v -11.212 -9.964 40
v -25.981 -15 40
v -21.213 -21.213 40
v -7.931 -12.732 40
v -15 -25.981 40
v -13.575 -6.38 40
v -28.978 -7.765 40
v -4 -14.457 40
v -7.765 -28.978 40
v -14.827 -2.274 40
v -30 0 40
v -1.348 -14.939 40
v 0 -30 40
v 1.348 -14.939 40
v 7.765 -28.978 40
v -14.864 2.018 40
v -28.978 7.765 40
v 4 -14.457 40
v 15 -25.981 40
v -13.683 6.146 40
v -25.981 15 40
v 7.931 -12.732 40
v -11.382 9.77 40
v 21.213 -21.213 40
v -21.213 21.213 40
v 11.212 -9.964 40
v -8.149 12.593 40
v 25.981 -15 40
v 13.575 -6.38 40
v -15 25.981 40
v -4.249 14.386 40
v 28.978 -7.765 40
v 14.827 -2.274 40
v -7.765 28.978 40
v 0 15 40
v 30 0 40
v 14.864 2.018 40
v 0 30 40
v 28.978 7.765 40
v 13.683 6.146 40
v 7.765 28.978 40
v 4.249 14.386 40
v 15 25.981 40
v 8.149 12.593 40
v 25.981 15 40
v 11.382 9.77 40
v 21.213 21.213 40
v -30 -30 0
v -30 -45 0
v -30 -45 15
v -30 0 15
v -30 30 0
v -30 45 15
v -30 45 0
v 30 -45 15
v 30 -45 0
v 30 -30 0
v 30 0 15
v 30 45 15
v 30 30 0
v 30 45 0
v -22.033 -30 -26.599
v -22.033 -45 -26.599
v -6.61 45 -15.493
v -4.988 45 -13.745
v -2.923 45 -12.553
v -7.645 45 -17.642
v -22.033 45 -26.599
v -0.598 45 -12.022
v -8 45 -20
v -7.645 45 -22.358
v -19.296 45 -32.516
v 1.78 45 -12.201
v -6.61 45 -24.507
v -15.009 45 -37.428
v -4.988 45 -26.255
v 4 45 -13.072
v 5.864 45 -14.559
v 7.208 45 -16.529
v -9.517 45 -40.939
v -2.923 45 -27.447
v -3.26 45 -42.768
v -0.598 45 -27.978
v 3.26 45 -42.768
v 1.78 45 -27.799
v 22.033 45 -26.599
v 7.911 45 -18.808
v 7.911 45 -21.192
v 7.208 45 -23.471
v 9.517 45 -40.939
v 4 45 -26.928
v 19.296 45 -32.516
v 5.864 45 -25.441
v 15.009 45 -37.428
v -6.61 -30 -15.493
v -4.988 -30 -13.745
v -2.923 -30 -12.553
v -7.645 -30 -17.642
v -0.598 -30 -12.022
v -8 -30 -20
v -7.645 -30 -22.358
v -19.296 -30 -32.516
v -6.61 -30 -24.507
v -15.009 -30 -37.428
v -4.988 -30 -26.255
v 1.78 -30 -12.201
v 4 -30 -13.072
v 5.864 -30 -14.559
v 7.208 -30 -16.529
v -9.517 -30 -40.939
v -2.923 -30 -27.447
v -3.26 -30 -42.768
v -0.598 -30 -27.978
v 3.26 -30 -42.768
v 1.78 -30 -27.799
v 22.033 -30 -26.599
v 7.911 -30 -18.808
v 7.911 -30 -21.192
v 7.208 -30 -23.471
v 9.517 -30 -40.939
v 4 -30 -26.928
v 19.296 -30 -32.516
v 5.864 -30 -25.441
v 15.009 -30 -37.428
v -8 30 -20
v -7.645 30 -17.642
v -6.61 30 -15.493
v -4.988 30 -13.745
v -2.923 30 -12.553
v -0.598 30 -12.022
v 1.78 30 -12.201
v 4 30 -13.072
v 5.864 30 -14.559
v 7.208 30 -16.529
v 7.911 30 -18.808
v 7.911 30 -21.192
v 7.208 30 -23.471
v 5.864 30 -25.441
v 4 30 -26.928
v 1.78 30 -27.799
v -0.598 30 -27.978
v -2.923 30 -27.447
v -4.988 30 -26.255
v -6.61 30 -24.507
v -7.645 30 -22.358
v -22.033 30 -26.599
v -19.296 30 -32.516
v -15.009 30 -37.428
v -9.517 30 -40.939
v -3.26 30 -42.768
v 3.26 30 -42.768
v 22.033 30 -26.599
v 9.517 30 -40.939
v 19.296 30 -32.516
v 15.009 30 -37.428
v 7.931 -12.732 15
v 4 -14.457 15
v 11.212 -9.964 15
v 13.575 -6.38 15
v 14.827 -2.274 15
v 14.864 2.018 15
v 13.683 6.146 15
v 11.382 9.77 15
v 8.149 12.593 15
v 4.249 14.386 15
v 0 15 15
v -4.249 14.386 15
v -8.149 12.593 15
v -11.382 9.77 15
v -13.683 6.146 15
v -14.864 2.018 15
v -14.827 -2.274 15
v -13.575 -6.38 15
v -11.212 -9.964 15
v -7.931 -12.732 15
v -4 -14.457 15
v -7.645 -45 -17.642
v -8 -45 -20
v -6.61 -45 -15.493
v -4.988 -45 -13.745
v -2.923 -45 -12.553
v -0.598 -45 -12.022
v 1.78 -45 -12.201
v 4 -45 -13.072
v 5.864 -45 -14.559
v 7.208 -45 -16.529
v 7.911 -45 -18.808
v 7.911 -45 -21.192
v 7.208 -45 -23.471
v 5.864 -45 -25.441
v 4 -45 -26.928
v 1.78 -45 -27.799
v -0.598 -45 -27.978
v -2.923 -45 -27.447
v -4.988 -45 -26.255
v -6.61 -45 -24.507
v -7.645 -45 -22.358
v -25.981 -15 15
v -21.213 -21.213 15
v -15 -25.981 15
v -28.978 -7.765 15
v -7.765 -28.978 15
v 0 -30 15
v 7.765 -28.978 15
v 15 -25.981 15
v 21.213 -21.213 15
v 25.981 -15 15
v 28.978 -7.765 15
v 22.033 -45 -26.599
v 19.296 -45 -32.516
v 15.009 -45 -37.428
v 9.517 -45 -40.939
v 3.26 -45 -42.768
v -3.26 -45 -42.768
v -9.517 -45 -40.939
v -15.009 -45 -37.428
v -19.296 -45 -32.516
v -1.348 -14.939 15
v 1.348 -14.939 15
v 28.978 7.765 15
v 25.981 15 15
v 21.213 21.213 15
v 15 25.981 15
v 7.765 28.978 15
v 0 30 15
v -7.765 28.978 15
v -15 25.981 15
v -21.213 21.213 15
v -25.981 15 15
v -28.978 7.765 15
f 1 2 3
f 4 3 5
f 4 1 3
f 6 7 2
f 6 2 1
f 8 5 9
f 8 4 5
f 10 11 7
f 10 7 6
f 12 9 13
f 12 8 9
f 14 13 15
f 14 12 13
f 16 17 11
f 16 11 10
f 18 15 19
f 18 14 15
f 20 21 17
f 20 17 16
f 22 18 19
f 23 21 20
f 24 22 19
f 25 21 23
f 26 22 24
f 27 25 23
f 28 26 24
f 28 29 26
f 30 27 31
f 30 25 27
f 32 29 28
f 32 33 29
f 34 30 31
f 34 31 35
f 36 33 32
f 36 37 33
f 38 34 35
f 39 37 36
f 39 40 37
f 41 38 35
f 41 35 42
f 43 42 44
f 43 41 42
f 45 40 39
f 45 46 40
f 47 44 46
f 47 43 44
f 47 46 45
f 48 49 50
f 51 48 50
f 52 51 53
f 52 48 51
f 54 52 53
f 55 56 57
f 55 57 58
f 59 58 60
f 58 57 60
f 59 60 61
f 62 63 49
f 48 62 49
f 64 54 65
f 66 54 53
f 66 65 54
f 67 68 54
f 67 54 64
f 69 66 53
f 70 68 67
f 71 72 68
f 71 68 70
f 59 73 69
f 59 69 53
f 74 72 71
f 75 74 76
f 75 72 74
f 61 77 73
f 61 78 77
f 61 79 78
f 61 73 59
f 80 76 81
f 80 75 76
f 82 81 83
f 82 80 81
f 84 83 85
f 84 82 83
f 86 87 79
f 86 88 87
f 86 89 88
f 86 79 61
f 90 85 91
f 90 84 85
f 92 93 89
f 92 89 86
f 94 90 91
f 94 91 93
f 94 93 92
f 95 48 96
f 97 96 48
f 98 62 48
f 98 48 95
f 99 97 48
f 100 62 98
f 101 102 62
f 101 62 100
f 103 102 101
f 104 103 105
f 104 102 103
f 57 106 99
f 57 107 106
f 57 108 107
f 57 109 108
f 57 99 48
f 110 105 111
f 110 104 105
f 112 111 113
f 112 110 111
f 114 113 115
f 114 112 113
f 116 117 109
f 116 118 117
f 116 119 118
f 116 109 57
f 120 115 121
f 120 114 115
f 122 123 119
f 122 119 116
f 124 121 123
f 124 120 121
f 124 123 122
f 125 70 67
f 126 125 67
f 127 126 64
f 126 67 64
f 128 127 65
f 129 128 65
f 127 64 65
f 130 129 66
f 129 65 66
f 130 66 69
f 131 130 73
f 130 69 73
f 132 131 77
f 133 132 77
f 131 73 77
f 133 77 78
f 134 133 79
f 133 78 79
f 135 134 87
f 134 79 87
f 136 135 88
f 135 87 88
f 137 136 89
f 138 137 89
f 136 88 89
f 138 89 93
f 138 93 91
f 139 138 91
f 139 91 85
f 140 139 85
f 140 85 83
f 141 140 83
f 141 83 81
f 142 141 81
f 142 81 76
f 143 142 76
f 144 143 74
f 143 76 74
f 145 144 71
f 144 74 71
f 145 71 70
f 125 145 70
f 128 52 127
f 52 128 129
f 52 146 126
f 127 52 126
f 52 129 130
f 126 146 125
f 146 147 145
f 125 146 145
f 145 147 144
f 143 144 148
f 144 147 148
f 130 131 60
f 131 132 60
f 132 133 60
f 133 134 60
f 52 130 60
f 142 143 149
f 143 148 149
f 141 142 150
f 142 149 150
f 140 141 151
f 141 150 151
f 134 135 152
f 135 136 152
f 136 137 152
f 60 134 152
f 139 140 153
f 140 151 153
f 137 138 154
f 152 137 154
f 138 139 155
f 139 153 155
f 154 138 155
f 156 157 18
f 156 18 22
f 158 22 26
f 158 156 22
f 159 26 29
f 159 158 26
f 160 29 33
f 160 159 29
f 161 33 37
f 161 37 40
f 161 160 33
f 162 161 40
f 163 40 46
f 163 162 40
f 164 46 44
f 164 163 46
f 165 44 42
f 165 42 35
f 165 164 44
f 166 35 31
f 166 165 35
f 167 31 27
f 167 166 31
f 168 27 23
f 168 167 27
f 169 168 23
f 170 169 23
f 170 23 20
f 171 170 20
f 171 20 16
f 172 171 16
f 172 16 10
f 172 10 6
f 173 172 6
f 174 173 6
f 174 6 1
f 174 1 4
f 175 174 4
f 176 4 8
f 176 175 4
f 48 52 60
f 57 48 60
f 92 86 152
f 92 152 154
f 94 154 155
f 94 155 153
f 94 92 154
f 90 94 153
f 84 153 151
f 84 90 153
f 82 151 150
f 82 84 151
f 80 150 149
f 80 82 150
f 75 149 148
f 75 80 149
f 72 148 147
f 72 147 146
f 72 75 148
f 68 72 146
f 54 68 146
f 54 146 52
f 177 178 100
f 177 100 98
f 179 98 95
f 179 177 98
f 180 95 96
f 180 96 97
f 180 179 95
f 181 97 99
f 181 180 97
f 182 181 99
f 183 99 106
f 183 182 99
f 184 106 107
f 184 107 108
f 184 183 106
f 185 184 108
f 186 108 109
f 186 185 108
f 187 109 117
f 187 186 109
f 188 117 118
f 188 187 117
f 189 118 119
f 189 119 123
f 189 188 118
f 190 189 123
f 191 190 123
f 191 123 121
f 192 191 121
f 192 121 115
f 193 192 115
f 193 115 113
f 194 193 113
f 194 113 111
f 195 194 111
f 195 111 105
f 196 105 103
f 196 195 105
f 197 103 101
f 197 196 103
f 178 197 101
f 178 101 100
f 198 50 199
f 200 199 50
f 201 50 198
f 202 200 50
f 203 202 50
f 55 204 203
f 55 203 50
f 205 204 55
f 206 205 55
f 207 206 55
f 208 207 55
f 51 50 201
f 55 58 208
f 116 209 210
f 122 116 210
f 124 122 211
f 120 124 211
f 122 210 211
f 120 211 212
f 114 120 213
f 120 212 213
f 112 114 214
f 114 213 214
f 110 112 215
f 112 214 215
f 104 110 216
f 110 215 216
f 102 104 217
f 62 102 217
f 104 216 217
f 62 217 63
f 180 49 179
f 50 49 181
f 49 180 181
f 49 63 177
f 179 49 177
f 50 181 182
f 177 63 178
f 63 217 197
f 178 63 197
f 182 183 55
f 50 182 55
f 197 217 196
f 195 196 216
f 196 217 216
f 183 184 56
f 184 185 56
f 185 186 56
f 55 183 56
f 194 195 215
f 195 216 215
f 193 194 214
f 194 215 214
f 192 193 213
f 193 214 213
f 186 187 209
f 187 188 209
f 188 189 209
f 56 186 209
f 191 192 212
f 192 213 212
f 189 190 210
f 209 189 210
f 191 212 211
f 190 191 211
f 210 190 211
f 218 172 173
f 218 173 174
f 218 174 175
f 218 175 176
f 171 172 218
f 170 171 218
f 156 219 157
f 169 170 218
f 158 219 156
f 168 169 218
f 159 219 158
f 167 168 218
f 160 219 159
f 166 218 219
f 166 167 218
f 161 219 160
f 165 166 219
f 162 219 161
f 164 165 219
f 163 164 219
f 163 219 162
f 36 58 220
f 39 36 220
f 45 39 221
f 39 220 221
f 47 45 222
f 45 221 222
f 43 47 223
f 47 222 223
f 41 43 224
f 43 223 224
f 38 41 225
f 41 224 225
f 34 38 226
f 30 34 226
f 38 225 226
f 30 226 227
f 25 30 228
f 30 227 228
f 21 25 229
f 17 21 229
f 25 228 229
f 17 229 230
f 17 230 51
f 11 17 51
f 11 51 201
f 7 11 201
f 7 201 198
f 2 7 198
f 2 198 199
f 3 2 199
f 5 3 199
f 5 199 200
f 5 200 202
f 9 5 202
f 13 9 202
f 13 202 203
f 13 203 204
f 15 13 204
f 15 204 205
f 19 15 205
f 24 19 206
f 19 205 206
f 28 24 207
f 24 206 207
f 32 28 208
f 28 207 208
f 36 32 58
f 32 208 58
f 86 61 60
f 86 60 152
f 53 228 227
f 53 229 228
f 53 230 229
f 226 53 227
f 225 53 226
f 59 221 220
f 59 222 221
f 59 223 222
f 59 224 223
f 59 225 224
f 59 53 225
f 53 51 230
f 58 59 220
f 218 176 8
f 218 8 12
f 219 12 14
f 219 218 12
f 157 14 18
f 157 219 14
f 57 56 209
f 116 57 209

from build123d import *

# Parameters (mm, degrees)
SKETCH1_W           = 60
SKETCH1_H           = 90
BOSS_EXTRUDE1_DEPTH = 15
SKETCH2_R           = 30
BOSS_EXTRUDE2_DEPTH = 25
SKETCH3_R           = 8
BOSS_EXTRUDE3_DEPTH = 15


with BuildPart() as part:
    # Sketch1 → Boss-Extrude1 (new body)
    with BuildSketch(Plane.XY):
        Rectangle(SKETCH1_W, SKETCH1_H)
    extrude(amount=BOSS_EXTRUDE1_DEPTH)

    # Sketch2 → Boss-Extrude2 (add)
    with BuildSketch(Plane.XY.offset(15)):
        Circle(SKETCH2_R)
        with BuildLine():
            ThreePointArc((4, -14.456832295), (0, 15), (-4, -14.456832295))
            ThreePointArc((-4, -14.456832295), (0, -15), (4, -14.456832295))
        make_face(mode=Mode.SUBTRACT)
    extrude(amount=BOSS_EXTRUDE2_DEPTH)

    # Sketch3 → Boss-Extrude3 (add)
    with BuildSketch(Plane(origin=(0, 45, 0), x_dir=(1, 0, 0), z_dir=(0, 1, 0))):
        with BuildLine():
            Line((30, 0), (22.03289839, 26.599347585))
            ThreePointArc((22.03289839, 26.599347585), (0, 43), (-22.03289839, 26.599347585))
            Line((-22.03289839, 26.599347585), (-30, 0))
            Line((-30, 0), (30, 0))
        make_face()
        with Locations(Location((0, 20, 0), (0, 0, 180))):
            Circle(SKETCH3_R, mode=Mode.SUBTRACT)
    boss_extrude3 = extrude(amount=-BOSS_EXTRUDE3_DEPTH)

    # Mirror1: Boss-Extrude3 across plane
    add(boss_extrude3.mirror(Plane.ZX))


solid = part.part
